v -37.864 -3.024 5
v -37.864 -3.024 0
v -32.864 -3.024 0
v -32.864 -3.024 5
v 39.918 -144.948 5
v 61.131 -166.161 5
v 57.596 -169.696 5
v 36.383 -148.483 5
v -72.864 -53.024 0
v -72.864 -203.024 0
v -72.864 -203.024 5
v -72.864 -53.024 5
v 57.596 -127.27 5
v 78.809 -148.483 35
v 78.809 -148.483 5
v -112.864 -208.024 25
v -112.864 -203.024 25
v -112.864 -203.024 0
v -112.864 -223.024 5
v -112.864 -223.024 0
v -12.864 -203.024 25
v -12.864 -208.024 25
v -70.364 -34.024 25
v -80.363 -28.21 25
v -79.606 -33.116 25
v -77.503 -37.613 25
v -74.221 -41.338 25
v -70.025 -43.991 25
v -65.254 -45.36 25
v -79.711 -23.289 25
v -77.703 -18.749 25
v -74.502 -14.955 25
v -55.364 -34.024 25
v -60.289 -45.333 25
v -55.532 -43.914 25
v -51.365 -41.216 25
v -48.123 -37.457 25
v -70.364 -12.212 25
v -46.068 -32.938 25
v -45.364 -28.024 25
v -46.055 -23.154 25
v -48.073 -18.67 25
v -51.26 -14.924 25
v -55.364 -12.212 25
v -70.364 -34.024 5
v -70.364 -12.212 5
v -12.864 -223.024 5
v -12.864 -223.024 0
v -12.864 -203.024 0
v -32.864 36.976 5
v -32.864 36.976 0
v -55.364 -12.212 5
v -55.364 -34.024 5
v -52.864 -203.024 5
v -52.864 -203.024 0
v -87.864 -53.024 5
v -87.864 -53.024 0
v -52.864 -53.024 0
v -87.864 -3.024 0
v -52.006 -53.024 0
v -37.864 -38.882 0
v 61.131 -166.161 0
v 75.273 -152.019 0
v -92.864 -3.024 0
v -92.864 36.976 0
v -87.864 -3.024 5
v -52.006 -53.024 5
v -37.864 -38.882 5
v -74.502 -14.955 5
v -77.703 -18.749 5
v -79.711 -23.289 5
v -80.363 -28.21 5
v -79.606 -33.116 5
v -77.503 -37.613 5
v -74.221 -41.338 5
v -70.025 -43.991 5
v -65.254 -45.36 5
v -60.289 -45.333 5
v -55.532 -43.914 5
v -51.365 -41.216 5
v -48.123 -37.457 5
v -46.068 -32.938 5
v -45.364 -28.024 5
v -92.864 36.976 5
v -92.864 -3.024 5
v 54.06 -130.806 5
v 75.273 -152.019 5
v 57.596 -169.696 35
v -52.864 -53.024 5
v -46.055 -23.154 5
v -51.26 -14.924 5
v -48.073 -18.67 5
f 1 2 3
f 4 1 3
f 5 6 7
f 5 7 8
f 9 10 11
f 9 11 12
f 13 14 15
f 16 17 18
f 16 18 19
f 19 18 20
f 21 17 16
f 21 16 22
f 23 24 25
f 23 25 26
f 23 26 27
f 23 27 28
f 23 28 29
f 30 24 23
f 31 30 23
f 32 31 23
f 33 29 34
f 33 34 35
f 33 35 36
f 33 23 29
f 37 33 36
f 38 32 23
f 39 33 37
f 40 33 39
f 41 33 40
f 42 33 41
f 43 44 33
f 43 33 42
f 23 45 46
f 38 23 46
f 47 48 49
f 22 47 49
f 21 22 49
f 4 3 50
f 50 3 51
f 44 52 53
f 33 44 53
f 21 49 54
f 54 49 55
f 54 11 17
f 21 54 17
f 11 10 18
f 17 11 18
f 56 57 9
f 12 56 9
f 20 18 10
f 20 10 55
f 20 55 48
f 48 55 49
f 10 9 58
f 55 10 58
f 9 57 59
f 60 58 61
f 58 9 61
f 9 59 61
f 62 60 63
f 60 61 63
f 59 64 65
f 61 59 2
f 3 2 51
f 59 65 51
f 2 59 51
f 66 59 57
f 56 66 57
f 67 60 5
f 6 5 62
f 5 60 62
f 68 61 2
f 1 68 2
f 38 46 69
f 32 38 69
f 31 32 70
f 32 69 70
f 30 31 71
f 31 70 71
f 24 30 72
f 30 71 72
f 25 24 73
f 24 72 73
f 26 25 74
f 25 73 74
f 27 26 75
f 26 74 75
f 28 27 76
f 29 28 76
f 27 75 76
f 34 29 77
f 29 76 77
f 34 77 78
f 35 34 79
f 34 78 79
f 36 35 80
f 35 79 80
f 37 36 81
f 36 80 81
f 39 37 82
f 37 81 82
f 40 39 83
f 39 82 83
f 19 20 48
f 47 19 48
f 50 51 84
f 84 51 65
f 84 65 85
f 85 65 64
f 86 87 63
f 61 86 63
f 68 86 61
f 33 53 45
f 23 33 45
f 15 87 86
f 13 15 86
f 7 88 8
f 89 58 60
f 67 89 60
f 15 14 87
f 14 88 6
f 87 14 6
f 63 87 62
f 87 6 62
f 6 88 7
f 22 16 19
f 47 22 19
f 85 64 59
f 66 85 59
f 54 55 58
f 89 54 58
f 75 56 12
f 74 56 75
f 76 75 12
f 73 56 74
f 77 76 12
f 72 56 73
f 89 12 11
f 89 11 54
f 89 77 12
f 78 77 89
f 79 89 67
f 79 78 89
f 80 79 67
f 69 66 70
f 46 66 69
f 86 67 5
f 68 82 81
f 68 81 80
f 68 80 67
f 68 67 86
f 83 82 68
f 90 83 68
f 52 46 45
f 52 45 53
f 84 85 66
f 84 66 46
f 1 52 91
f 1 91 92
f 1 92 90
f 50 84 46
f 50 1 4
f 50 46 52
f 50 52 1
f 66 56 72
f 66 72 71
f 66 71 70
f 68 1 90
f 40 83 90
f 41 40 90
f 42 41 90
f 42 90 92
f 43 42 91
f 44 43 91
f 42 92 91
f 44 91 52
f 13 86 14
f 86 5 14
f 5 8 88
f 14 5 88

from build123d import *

# Parameters (mm, degrees)
F0_W          = 10
F0_H          = 150
F0_W_2        = 15
F0_H_2        = 31
F1_DEPTH      = 5
F2_DEPTH      = 25
F3_DEPTH      = 25
F5_DEPTH      = 25
F5_DEPTH_BACK = 5
F7_DEPTH      = 100


# Not quite as in the source:
# - a feature names something its author has since deleted; it is built from what else it names


with BuildPart() as f1:
    # F0 (on Top) → F1 (new body)
    with BuildSketch(Plane.XY):
        with BuildLine():
            Line((-70.3635856962, -3.0238344104), (-87.8635856962, -3.0238344104))
            Line((-87.8635856962, -3.0238344104), (-87.8635856962, -53.0238344104))
            Line((-87.8635856962, -53.0238344104), (-72.8635856962, -53.0238344104))
            Line((-72.8635856962, -53.0238344104), (-62.8635856962, -53.0238344104))
            Line((-62.8635856962, -53.0238344104), (-52.8635856962, -53.0238344104))
            Line((-52.8635856962, -53.0238344104), (-52.0057213199, -53.0238344104))
            Line((-52.0057213199, -53.0238344104), (-37.8635856962, -38.8816987866))
            Line((-37.8635856962, -38.8816987866), (-37.8635856962, -3.0238344104))
            Line((-37.8635856962, -3.0238344104), (-55.3635856962, -3.0238344104))
            Line((-55.3635856962, -3.0238344104), (-55.3635856962, -12.2124461095))
            ThreePointArc((-55.3635856962, -12.2124461095), (-48.0733862384, -18.6696909434), (-45.3635856962, -28.0238344104))
            ThreePointArc((-45.3635856962, -28.0238344104), (-72.2177291631, -42.8140338681), (-70.3635856962, -12.2124461095))
            Line((-70.3635856962, -12.2124461095), (-70.3635856962, -3.0238344104))
        make_face()
        with Locations((-67.8635856962, -128.0238344104)):
            Rectangle(F0_W, F0_H)
        with Locations((-57.8635856962, -128.0238344104)):
            Rectangle(F0_W, F0_H)
        Polygon((-37.8635856962, -53.0238344104), (-37.8635856962, -38.8816987866), (-52.0057213199, -53.0238344104), align=None)
        Polygon((75.2734992937, -152.0187837765), (-37.8635856962, -38.8816987866), (-37.8635856962, -53.0238344104), (-52.0057213199, -53.0238344104), (61.13136367, -166.1609194002), align=None)
        Polygon((-92.8635856962, -3.0238344104), (-87.8635856962, -3.0238344104), (-70.3635856962, -3.0238344104), (-70.3635856962, 27.9761655896), (-55.3635856962, 27.9761655896), (-55.3635856962, -3.0238344104), (-37.8635856962, -3.0238344104), (-32.8635856962, -3.0238344104), (-32.8635856962, 36.9761655896), (-92.8635856962, 36.9761655896), align=None)
        with Locations((-62.8635856962, 12.4761655896)):
            Rectangle(F0_W_2, F0_H_2)
        with BuildLine():
            Line((-55.3635856962, -3.0238344104), (-70.3635856962, -3.0238344104))
            Line((-70.3635856962, -3.0238344104), (-70.3635856962, -12.2124461095))
            ThreePointArc((-70.3635856962, -12.2124461095), (-62.8635856962, -10.5238344104), (-55.3635856962, -12.2124461095))
            Line((-55.3635856962, -12.2124461095), (-55.3635856962, -3.0238344104))
        make_face()
        with BuildLine():
            ThreePointArc((-55.3635856962, -12.2124461095), (-62.8635856962, -10.5238344104), (-70.3635856962, -12.2124461095))
            Line((-70.3635856962, -12.2124461095), (-70.3635856962, -34.0238344104))
            Line((-70.3635856962, -34.0238344104), (-55.3635856962, -34.0238344104))
            Line((-55.3635856962, -34.0238344104), (-55.3635856962, -12.2124461095))
        make_face()
    extrude(amount=F1_DEPTH)

    # F0 (on Top) → F2 (join)
    with BuildSketch(Plane.XY):
        with BuildLine():
            Line((-70.3635856962, -34.0238344104), (-70.3635856962, -12.2124461095))
            ThreePointArc((-70.3635856962, -12.2124461095), (-72.2177291631, -42.8140338681), (-45.3635856962, -28.0238344104))
            ThreePointArc((-45.3635856962, -28.0238344104), (-48.0733862384, -18.6696909434), (-55.3635856962, -12.2124461095))
            Line((-55.3635856962, -12.2124461095), (-55.3635856962, -34.0238344104))
            Line((-55.3635856962, -34.0238344104), (-70.3635856962, -34.0238344104))
        make_face()
    extrude(amount=F2_DEPTH)

    # F0 (on Top) → F3 (join)
    with BuildSketch(Plane.XY):
        Polygon((-62.8635856962, -203.0238344104), (-72.8635856962, -203.0238344104), (-112.8635856962, -203.0238344104), (-112.8635856962, -223.0238344104), (-12.8635856962, -223.0238344104), (-12.8635856962, -203.0238344104), (-52.8635856962, -203.0238344104), align=None)
    extrude(amount=F3_DEPTH)

    # F4 (on face) → F5 (join, two sides)
    with BuildSketch(Plane(origin=(-38.3726422414, -38.3726422414, 0), x_dir=(-0.7071067812, 0.7071067812, 0), z_dir=(0.7071067812, 0.7071067812, 0))) as f5_sk:
        Polygon((-160.7199146703, 35), (-160.7199146703, 5), (-130.7199146703, 5), align=None)
    extrude(amount=-F5_DEPTH)
    extrude(f5_sk.sketch, amount=F5_DEPTH_BACK)

    # F6 (on face) → F7 (cut, through all)
    with BuildSketch(Plane(origin=(-112.8635856962, 0, 0), x_dir=(0, -1, 0), z_dir=(-1, 0, 0))):
        Polygon((223.0238344104, 25), (208.0238344104, 25), (223.0238344104, 5), align=None)
    extrude(amount=-F7_DEPTH, mode=Mode.SUBTRACT)


solid = f1.part
